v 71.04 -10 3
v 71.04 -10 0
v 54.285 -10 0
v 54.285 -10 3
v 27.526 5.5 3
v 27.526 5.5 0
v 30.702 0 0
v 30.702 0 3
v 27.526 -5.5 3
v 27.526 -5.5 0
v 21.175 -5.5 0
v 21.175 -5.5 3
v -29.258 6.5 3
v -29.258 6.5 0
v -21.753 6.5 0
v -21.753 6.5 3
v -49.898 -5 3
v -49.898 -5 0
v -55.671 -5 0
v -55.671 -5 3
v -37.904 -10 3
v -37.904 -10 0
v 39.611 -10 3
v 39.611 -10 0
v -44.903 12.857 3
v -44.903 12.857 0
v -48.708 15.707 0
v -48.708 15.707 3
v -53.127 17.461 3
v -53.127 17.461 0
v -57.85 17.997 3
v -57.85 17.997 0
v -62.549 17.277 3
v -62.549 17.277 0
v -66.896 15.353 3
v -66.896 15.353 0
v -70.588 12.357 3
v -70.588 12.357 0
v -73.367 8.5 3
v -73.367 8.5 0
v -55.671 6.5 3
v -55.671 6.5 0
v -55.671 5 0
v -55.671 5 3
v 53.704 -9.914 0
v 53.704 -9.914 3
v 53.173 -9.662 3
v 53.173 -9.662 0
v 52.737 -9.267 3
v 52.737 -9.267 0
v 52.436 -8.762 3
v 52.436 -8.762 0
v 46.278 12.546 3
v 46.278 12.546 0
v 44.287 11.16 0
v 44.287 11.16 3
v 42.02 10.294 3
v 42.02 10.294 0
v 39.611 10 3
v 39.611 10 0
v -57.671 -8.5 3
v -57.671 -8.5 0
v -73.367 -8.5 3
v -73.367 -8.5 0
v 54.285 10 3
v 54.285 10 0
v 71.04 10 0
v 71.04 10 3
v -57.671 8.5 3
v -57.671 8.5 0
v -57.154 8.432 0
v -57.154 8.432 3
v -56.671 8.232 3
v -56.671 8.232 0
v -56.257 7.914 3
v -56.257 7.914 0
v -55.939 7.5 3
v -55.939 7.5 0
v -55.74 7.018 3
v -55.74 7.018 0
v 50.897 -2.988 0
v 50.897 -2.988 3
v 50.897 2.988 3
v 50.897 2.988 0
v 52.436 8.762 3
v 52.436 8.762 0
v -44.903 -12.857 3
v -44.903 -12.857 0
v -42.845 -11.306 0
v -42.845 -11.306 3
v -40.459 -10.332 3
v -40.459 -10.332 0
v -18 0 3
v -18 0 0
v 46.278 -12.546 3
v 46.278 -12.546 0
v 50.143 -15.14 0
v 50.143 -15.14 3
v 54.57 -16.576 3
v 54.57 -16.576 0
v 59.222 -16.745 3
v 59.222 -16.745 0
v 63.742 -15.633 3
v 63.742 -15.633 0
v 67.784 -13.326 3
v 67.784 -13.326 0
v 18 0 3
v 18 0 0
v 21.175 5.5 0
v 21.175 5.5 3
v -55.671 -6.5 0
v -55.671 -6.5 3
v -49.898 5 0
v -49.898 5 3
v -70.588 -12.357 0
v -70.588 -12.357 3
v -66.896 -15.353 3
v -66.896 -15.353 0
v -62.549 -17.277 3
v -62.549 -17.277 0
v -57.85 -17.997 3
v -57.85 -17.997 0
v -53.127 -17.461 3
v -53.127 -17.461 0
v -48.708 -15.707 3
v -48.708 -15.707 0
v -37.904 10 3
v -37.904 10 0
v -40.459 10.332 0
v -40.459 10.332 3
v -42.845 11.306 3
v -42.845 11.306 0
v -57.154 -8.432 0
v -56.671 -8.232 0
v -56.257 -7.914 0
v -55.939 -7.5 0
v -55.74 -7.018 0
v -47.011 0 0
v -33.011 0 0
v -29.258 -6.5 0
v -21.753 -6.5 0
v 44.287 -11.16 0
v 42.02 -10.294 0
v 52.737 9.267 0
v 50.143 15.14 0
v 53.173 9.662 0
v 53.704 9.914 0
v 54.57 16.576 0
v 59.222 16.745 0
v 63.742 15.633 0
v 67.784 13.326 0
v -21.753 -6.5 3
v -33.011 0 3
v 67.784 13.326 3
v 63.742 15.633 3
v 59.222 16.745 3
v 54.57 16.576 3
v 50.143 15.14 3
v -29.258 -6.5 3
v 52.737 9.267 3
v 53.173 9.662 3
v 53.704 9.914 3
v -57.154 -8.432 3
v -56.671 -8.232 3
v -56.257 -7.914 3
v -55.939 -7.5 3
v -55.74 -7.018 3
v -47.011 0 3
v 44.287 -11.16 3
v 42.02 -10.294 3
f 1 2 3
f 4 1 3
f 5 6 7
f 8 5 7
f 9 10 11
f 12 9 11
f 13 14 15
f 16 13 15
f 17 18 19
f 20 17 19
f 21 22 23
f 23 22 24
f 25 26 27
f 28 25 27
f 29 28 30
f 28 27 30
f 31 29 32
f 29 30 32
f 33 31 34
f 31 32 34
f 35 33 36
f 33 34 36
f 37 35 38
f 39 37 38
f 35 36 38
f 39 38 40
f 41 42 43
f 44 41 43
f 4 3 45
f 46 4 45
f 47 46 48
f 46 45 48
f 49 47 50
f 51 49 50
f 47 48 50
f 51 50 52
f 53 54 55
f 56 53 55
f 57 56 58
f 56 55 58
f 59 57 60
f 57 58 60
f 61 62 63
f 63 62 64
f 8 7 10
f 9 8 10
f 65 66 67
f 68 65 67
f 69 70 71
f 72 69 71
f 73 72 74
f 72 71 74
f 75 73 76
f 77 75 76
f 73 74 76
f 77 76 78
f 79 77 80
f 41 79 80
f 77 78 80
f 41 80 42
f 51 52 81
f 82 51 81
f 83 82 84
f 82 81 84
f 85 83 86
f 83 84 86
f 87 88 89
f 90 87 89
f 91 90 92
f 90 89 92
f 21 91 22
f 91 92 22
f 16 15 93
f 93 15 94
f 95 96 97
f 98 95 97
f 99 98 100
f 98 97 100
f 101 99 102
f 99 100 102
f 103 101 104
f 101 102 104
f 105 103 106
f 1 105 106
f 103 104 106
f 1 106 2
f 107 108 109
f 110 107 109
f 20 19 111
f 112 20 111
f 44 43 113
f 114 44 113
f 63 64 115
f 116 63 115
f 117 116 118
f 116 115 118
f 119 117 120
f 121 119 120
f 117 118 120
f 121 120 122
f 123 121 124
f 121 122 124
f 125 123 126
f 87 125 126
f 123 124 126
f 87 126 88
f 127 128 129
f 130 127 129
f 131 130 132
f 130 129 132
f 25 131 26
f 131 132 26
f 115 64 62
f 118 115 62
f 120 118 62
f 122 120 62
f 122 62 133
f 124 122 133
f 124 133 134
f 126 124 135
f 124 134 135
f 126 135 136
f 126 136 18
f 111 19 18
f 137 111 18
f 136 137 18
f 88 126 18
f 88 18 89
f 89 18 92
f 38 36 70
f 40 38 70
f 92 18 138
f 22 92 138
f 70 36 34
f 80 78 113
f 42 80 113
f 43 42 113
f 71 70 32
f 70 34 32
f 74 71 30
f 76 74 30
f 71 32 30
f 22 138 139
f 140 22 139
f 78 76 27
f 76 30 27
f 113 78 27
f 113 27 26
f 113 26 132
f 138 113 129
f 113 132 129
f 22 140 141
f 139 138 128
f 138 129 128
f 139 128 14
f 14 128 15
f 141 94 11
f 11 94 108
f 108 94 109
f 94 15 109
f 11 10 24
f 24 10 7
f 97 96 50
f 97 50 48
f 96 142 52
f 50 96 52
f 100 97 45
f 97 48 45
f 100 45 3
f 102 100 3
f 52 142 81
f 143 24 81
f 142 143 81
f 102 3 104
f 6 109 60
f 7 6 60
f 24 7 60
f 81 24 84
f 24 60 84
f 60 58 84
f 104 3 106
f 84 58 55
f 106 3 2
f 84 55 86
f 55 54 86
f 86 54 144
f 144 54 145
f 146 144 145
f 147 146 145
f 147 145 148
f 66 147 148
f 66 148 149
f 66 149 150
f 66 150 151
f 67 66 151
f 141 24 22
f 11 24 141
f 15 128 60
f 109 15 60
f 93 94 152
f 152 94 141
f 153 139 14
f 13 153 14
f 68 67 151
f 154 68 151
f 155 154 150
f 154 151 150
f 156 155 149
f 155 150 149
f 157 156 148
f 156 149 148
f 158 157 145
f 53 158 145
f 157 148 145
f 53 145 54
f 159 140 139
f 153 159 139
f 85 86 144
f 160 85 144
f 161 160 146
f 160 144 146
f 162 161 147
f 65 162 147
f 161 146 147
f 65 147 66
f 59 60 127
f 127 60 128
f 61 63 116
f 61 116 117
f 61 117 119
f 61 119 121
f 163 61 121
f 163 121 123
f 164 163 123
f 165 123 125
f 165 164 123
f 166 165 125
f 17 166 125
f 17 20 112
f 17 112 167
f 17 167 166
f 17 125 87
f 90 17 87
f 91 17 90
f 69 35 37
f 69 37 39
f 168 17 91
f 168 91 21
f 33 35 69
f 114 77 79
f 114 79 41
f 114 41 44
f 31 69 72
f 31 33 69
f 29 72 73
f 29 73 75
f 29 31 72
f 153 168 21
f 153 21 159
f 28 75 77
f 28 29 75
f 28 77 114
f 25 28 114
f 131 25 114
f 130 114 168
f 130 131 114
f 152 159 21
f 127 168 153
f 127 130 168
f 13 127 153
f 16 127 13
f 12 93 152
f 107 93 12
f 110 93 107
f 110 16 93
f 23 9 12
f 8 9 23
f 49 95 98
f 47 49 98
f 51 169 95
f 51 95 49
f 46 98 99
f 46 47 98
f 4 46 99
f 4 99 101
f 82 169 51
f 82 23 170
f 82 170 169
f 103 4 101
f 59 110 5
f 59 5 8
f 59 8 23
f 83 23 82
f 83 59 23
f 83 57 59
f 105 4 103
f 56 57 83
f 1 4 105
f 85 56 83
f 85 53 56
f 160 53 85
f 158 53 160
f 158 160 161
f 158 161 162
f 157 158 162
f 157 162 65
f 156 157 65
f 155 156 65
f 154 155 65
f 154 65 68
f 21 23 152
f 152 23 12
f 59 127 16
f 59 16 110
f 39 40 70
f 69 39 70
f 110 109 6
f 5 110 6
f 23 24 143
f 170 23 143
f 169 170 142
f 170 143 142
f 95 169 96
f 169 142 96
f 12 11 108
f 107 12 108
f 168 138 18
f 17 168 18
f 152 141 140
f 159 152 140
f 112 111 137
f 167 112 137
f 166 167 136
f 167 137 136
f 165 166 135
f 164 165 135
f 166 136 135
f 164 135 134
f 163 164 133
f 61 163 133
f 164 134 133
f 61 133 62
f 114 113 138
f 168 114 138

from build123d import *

# Parameters (mm, degrees)
F1_DEPTH = 3


with BuildPart() as f1:
    # F0 (on Top) → F1 (new body)
    with BuildSketch(Plane.XY):
        with BuildLine():
            ThreePointArc((-37.904082, 10), (-41.683727, 10.741799), (-44.902624, 12.857143))
            ThreePointArc((-44.902624, 12.857143), (-60.223634, 17.792746), (-73.366632, 8.5))
            Line((-73.366632, 8.5), (-57.671361, 8.5))
            ThreePointArc((-57.671361, 8.5), (-56.257147, 7.914214), (-55.671361, 6.5))
            Line((-55.671361, 6.5), (-55.671361, 5))
            Line((-55.671361, 5), (-52.78461, 5))
            Line((-52.78461, 5), (-49.897858, 5))
            Line((-49.897858, 5), (-47.011107, 0))
            Line((-47.011107, 0), (-49.897858, -5))
            Line((-49.897858, -5), (-52.78461, -5))
            Line((-52.78461, -5), (-55.671361, -5))
            Line((-55.671361, -5), (-55.671361, -6.5))
            ThreePointArc((-55.671361, -6.5), (-56.257147, -7.914214), (-57.671361, -8.5))
            Line((-57.671361, -8.5), (-73.366632, -8.5))
            ThreePointArc((-73.366632, -8.5), (-60.223634, -17.792746), (-44.902624, -12.857143))
            ThreePointArc((-44.902624, -12.857143), (-41.683727, -10.741799), (-37.904082, -10))
            Line((-37.904082, -10), (39.611456, -10))
            ThreePointArc((39.611456, -10), (43.179677, -10.658276), (46.278123, -12.54644))
            ThreePointArc((46.278123, -12.54644), (59.221926, -16.744511), (71.040446, -10))
            Line((71.040446, -10), (54.285218, -10))
            ThreePointArc((54.285218, -10), (53.172521, -9.661898), (52.436029, -8.761905))
            ThreePointArc((52.436029, -8.761905), (50.701706, 0), (52.436029, 8.761905))
            ThreePointArc((52.436029, 8.761905), (53.172521, 9.661898), (54.285218, 10))
            Line((54.285218, 10), (71.040446, 10))
            ThreePointArc((71.040446, 10), (59.221926, 16.744511), (46.278123, 12.54644))
            ThreePointArc((46.278123, 12.54644), (43.179677, 10.658276), (39.611456, 10))
            Line((39.611456, 10), (-37.904082, 10))
        make_face()
        Polygon((-33.011107, 0), (-29.25833, 6.5), (-21.752777, 6.5), (-18, 0), (-21.752777, -6.5), (-29.25833, -6.5), align=None, mode=Mode.SUBTRACT)
        Polygon((18, 0), (21.175426, 5.5), (27.526279, 5.5), (30.701706, 0), (27.526279, -5.5), (21.175426, -5.5), align=None, mode=Mode.SUBTRACT)
    extrude(amount=F1_DEPTH)


solid = f1.part
